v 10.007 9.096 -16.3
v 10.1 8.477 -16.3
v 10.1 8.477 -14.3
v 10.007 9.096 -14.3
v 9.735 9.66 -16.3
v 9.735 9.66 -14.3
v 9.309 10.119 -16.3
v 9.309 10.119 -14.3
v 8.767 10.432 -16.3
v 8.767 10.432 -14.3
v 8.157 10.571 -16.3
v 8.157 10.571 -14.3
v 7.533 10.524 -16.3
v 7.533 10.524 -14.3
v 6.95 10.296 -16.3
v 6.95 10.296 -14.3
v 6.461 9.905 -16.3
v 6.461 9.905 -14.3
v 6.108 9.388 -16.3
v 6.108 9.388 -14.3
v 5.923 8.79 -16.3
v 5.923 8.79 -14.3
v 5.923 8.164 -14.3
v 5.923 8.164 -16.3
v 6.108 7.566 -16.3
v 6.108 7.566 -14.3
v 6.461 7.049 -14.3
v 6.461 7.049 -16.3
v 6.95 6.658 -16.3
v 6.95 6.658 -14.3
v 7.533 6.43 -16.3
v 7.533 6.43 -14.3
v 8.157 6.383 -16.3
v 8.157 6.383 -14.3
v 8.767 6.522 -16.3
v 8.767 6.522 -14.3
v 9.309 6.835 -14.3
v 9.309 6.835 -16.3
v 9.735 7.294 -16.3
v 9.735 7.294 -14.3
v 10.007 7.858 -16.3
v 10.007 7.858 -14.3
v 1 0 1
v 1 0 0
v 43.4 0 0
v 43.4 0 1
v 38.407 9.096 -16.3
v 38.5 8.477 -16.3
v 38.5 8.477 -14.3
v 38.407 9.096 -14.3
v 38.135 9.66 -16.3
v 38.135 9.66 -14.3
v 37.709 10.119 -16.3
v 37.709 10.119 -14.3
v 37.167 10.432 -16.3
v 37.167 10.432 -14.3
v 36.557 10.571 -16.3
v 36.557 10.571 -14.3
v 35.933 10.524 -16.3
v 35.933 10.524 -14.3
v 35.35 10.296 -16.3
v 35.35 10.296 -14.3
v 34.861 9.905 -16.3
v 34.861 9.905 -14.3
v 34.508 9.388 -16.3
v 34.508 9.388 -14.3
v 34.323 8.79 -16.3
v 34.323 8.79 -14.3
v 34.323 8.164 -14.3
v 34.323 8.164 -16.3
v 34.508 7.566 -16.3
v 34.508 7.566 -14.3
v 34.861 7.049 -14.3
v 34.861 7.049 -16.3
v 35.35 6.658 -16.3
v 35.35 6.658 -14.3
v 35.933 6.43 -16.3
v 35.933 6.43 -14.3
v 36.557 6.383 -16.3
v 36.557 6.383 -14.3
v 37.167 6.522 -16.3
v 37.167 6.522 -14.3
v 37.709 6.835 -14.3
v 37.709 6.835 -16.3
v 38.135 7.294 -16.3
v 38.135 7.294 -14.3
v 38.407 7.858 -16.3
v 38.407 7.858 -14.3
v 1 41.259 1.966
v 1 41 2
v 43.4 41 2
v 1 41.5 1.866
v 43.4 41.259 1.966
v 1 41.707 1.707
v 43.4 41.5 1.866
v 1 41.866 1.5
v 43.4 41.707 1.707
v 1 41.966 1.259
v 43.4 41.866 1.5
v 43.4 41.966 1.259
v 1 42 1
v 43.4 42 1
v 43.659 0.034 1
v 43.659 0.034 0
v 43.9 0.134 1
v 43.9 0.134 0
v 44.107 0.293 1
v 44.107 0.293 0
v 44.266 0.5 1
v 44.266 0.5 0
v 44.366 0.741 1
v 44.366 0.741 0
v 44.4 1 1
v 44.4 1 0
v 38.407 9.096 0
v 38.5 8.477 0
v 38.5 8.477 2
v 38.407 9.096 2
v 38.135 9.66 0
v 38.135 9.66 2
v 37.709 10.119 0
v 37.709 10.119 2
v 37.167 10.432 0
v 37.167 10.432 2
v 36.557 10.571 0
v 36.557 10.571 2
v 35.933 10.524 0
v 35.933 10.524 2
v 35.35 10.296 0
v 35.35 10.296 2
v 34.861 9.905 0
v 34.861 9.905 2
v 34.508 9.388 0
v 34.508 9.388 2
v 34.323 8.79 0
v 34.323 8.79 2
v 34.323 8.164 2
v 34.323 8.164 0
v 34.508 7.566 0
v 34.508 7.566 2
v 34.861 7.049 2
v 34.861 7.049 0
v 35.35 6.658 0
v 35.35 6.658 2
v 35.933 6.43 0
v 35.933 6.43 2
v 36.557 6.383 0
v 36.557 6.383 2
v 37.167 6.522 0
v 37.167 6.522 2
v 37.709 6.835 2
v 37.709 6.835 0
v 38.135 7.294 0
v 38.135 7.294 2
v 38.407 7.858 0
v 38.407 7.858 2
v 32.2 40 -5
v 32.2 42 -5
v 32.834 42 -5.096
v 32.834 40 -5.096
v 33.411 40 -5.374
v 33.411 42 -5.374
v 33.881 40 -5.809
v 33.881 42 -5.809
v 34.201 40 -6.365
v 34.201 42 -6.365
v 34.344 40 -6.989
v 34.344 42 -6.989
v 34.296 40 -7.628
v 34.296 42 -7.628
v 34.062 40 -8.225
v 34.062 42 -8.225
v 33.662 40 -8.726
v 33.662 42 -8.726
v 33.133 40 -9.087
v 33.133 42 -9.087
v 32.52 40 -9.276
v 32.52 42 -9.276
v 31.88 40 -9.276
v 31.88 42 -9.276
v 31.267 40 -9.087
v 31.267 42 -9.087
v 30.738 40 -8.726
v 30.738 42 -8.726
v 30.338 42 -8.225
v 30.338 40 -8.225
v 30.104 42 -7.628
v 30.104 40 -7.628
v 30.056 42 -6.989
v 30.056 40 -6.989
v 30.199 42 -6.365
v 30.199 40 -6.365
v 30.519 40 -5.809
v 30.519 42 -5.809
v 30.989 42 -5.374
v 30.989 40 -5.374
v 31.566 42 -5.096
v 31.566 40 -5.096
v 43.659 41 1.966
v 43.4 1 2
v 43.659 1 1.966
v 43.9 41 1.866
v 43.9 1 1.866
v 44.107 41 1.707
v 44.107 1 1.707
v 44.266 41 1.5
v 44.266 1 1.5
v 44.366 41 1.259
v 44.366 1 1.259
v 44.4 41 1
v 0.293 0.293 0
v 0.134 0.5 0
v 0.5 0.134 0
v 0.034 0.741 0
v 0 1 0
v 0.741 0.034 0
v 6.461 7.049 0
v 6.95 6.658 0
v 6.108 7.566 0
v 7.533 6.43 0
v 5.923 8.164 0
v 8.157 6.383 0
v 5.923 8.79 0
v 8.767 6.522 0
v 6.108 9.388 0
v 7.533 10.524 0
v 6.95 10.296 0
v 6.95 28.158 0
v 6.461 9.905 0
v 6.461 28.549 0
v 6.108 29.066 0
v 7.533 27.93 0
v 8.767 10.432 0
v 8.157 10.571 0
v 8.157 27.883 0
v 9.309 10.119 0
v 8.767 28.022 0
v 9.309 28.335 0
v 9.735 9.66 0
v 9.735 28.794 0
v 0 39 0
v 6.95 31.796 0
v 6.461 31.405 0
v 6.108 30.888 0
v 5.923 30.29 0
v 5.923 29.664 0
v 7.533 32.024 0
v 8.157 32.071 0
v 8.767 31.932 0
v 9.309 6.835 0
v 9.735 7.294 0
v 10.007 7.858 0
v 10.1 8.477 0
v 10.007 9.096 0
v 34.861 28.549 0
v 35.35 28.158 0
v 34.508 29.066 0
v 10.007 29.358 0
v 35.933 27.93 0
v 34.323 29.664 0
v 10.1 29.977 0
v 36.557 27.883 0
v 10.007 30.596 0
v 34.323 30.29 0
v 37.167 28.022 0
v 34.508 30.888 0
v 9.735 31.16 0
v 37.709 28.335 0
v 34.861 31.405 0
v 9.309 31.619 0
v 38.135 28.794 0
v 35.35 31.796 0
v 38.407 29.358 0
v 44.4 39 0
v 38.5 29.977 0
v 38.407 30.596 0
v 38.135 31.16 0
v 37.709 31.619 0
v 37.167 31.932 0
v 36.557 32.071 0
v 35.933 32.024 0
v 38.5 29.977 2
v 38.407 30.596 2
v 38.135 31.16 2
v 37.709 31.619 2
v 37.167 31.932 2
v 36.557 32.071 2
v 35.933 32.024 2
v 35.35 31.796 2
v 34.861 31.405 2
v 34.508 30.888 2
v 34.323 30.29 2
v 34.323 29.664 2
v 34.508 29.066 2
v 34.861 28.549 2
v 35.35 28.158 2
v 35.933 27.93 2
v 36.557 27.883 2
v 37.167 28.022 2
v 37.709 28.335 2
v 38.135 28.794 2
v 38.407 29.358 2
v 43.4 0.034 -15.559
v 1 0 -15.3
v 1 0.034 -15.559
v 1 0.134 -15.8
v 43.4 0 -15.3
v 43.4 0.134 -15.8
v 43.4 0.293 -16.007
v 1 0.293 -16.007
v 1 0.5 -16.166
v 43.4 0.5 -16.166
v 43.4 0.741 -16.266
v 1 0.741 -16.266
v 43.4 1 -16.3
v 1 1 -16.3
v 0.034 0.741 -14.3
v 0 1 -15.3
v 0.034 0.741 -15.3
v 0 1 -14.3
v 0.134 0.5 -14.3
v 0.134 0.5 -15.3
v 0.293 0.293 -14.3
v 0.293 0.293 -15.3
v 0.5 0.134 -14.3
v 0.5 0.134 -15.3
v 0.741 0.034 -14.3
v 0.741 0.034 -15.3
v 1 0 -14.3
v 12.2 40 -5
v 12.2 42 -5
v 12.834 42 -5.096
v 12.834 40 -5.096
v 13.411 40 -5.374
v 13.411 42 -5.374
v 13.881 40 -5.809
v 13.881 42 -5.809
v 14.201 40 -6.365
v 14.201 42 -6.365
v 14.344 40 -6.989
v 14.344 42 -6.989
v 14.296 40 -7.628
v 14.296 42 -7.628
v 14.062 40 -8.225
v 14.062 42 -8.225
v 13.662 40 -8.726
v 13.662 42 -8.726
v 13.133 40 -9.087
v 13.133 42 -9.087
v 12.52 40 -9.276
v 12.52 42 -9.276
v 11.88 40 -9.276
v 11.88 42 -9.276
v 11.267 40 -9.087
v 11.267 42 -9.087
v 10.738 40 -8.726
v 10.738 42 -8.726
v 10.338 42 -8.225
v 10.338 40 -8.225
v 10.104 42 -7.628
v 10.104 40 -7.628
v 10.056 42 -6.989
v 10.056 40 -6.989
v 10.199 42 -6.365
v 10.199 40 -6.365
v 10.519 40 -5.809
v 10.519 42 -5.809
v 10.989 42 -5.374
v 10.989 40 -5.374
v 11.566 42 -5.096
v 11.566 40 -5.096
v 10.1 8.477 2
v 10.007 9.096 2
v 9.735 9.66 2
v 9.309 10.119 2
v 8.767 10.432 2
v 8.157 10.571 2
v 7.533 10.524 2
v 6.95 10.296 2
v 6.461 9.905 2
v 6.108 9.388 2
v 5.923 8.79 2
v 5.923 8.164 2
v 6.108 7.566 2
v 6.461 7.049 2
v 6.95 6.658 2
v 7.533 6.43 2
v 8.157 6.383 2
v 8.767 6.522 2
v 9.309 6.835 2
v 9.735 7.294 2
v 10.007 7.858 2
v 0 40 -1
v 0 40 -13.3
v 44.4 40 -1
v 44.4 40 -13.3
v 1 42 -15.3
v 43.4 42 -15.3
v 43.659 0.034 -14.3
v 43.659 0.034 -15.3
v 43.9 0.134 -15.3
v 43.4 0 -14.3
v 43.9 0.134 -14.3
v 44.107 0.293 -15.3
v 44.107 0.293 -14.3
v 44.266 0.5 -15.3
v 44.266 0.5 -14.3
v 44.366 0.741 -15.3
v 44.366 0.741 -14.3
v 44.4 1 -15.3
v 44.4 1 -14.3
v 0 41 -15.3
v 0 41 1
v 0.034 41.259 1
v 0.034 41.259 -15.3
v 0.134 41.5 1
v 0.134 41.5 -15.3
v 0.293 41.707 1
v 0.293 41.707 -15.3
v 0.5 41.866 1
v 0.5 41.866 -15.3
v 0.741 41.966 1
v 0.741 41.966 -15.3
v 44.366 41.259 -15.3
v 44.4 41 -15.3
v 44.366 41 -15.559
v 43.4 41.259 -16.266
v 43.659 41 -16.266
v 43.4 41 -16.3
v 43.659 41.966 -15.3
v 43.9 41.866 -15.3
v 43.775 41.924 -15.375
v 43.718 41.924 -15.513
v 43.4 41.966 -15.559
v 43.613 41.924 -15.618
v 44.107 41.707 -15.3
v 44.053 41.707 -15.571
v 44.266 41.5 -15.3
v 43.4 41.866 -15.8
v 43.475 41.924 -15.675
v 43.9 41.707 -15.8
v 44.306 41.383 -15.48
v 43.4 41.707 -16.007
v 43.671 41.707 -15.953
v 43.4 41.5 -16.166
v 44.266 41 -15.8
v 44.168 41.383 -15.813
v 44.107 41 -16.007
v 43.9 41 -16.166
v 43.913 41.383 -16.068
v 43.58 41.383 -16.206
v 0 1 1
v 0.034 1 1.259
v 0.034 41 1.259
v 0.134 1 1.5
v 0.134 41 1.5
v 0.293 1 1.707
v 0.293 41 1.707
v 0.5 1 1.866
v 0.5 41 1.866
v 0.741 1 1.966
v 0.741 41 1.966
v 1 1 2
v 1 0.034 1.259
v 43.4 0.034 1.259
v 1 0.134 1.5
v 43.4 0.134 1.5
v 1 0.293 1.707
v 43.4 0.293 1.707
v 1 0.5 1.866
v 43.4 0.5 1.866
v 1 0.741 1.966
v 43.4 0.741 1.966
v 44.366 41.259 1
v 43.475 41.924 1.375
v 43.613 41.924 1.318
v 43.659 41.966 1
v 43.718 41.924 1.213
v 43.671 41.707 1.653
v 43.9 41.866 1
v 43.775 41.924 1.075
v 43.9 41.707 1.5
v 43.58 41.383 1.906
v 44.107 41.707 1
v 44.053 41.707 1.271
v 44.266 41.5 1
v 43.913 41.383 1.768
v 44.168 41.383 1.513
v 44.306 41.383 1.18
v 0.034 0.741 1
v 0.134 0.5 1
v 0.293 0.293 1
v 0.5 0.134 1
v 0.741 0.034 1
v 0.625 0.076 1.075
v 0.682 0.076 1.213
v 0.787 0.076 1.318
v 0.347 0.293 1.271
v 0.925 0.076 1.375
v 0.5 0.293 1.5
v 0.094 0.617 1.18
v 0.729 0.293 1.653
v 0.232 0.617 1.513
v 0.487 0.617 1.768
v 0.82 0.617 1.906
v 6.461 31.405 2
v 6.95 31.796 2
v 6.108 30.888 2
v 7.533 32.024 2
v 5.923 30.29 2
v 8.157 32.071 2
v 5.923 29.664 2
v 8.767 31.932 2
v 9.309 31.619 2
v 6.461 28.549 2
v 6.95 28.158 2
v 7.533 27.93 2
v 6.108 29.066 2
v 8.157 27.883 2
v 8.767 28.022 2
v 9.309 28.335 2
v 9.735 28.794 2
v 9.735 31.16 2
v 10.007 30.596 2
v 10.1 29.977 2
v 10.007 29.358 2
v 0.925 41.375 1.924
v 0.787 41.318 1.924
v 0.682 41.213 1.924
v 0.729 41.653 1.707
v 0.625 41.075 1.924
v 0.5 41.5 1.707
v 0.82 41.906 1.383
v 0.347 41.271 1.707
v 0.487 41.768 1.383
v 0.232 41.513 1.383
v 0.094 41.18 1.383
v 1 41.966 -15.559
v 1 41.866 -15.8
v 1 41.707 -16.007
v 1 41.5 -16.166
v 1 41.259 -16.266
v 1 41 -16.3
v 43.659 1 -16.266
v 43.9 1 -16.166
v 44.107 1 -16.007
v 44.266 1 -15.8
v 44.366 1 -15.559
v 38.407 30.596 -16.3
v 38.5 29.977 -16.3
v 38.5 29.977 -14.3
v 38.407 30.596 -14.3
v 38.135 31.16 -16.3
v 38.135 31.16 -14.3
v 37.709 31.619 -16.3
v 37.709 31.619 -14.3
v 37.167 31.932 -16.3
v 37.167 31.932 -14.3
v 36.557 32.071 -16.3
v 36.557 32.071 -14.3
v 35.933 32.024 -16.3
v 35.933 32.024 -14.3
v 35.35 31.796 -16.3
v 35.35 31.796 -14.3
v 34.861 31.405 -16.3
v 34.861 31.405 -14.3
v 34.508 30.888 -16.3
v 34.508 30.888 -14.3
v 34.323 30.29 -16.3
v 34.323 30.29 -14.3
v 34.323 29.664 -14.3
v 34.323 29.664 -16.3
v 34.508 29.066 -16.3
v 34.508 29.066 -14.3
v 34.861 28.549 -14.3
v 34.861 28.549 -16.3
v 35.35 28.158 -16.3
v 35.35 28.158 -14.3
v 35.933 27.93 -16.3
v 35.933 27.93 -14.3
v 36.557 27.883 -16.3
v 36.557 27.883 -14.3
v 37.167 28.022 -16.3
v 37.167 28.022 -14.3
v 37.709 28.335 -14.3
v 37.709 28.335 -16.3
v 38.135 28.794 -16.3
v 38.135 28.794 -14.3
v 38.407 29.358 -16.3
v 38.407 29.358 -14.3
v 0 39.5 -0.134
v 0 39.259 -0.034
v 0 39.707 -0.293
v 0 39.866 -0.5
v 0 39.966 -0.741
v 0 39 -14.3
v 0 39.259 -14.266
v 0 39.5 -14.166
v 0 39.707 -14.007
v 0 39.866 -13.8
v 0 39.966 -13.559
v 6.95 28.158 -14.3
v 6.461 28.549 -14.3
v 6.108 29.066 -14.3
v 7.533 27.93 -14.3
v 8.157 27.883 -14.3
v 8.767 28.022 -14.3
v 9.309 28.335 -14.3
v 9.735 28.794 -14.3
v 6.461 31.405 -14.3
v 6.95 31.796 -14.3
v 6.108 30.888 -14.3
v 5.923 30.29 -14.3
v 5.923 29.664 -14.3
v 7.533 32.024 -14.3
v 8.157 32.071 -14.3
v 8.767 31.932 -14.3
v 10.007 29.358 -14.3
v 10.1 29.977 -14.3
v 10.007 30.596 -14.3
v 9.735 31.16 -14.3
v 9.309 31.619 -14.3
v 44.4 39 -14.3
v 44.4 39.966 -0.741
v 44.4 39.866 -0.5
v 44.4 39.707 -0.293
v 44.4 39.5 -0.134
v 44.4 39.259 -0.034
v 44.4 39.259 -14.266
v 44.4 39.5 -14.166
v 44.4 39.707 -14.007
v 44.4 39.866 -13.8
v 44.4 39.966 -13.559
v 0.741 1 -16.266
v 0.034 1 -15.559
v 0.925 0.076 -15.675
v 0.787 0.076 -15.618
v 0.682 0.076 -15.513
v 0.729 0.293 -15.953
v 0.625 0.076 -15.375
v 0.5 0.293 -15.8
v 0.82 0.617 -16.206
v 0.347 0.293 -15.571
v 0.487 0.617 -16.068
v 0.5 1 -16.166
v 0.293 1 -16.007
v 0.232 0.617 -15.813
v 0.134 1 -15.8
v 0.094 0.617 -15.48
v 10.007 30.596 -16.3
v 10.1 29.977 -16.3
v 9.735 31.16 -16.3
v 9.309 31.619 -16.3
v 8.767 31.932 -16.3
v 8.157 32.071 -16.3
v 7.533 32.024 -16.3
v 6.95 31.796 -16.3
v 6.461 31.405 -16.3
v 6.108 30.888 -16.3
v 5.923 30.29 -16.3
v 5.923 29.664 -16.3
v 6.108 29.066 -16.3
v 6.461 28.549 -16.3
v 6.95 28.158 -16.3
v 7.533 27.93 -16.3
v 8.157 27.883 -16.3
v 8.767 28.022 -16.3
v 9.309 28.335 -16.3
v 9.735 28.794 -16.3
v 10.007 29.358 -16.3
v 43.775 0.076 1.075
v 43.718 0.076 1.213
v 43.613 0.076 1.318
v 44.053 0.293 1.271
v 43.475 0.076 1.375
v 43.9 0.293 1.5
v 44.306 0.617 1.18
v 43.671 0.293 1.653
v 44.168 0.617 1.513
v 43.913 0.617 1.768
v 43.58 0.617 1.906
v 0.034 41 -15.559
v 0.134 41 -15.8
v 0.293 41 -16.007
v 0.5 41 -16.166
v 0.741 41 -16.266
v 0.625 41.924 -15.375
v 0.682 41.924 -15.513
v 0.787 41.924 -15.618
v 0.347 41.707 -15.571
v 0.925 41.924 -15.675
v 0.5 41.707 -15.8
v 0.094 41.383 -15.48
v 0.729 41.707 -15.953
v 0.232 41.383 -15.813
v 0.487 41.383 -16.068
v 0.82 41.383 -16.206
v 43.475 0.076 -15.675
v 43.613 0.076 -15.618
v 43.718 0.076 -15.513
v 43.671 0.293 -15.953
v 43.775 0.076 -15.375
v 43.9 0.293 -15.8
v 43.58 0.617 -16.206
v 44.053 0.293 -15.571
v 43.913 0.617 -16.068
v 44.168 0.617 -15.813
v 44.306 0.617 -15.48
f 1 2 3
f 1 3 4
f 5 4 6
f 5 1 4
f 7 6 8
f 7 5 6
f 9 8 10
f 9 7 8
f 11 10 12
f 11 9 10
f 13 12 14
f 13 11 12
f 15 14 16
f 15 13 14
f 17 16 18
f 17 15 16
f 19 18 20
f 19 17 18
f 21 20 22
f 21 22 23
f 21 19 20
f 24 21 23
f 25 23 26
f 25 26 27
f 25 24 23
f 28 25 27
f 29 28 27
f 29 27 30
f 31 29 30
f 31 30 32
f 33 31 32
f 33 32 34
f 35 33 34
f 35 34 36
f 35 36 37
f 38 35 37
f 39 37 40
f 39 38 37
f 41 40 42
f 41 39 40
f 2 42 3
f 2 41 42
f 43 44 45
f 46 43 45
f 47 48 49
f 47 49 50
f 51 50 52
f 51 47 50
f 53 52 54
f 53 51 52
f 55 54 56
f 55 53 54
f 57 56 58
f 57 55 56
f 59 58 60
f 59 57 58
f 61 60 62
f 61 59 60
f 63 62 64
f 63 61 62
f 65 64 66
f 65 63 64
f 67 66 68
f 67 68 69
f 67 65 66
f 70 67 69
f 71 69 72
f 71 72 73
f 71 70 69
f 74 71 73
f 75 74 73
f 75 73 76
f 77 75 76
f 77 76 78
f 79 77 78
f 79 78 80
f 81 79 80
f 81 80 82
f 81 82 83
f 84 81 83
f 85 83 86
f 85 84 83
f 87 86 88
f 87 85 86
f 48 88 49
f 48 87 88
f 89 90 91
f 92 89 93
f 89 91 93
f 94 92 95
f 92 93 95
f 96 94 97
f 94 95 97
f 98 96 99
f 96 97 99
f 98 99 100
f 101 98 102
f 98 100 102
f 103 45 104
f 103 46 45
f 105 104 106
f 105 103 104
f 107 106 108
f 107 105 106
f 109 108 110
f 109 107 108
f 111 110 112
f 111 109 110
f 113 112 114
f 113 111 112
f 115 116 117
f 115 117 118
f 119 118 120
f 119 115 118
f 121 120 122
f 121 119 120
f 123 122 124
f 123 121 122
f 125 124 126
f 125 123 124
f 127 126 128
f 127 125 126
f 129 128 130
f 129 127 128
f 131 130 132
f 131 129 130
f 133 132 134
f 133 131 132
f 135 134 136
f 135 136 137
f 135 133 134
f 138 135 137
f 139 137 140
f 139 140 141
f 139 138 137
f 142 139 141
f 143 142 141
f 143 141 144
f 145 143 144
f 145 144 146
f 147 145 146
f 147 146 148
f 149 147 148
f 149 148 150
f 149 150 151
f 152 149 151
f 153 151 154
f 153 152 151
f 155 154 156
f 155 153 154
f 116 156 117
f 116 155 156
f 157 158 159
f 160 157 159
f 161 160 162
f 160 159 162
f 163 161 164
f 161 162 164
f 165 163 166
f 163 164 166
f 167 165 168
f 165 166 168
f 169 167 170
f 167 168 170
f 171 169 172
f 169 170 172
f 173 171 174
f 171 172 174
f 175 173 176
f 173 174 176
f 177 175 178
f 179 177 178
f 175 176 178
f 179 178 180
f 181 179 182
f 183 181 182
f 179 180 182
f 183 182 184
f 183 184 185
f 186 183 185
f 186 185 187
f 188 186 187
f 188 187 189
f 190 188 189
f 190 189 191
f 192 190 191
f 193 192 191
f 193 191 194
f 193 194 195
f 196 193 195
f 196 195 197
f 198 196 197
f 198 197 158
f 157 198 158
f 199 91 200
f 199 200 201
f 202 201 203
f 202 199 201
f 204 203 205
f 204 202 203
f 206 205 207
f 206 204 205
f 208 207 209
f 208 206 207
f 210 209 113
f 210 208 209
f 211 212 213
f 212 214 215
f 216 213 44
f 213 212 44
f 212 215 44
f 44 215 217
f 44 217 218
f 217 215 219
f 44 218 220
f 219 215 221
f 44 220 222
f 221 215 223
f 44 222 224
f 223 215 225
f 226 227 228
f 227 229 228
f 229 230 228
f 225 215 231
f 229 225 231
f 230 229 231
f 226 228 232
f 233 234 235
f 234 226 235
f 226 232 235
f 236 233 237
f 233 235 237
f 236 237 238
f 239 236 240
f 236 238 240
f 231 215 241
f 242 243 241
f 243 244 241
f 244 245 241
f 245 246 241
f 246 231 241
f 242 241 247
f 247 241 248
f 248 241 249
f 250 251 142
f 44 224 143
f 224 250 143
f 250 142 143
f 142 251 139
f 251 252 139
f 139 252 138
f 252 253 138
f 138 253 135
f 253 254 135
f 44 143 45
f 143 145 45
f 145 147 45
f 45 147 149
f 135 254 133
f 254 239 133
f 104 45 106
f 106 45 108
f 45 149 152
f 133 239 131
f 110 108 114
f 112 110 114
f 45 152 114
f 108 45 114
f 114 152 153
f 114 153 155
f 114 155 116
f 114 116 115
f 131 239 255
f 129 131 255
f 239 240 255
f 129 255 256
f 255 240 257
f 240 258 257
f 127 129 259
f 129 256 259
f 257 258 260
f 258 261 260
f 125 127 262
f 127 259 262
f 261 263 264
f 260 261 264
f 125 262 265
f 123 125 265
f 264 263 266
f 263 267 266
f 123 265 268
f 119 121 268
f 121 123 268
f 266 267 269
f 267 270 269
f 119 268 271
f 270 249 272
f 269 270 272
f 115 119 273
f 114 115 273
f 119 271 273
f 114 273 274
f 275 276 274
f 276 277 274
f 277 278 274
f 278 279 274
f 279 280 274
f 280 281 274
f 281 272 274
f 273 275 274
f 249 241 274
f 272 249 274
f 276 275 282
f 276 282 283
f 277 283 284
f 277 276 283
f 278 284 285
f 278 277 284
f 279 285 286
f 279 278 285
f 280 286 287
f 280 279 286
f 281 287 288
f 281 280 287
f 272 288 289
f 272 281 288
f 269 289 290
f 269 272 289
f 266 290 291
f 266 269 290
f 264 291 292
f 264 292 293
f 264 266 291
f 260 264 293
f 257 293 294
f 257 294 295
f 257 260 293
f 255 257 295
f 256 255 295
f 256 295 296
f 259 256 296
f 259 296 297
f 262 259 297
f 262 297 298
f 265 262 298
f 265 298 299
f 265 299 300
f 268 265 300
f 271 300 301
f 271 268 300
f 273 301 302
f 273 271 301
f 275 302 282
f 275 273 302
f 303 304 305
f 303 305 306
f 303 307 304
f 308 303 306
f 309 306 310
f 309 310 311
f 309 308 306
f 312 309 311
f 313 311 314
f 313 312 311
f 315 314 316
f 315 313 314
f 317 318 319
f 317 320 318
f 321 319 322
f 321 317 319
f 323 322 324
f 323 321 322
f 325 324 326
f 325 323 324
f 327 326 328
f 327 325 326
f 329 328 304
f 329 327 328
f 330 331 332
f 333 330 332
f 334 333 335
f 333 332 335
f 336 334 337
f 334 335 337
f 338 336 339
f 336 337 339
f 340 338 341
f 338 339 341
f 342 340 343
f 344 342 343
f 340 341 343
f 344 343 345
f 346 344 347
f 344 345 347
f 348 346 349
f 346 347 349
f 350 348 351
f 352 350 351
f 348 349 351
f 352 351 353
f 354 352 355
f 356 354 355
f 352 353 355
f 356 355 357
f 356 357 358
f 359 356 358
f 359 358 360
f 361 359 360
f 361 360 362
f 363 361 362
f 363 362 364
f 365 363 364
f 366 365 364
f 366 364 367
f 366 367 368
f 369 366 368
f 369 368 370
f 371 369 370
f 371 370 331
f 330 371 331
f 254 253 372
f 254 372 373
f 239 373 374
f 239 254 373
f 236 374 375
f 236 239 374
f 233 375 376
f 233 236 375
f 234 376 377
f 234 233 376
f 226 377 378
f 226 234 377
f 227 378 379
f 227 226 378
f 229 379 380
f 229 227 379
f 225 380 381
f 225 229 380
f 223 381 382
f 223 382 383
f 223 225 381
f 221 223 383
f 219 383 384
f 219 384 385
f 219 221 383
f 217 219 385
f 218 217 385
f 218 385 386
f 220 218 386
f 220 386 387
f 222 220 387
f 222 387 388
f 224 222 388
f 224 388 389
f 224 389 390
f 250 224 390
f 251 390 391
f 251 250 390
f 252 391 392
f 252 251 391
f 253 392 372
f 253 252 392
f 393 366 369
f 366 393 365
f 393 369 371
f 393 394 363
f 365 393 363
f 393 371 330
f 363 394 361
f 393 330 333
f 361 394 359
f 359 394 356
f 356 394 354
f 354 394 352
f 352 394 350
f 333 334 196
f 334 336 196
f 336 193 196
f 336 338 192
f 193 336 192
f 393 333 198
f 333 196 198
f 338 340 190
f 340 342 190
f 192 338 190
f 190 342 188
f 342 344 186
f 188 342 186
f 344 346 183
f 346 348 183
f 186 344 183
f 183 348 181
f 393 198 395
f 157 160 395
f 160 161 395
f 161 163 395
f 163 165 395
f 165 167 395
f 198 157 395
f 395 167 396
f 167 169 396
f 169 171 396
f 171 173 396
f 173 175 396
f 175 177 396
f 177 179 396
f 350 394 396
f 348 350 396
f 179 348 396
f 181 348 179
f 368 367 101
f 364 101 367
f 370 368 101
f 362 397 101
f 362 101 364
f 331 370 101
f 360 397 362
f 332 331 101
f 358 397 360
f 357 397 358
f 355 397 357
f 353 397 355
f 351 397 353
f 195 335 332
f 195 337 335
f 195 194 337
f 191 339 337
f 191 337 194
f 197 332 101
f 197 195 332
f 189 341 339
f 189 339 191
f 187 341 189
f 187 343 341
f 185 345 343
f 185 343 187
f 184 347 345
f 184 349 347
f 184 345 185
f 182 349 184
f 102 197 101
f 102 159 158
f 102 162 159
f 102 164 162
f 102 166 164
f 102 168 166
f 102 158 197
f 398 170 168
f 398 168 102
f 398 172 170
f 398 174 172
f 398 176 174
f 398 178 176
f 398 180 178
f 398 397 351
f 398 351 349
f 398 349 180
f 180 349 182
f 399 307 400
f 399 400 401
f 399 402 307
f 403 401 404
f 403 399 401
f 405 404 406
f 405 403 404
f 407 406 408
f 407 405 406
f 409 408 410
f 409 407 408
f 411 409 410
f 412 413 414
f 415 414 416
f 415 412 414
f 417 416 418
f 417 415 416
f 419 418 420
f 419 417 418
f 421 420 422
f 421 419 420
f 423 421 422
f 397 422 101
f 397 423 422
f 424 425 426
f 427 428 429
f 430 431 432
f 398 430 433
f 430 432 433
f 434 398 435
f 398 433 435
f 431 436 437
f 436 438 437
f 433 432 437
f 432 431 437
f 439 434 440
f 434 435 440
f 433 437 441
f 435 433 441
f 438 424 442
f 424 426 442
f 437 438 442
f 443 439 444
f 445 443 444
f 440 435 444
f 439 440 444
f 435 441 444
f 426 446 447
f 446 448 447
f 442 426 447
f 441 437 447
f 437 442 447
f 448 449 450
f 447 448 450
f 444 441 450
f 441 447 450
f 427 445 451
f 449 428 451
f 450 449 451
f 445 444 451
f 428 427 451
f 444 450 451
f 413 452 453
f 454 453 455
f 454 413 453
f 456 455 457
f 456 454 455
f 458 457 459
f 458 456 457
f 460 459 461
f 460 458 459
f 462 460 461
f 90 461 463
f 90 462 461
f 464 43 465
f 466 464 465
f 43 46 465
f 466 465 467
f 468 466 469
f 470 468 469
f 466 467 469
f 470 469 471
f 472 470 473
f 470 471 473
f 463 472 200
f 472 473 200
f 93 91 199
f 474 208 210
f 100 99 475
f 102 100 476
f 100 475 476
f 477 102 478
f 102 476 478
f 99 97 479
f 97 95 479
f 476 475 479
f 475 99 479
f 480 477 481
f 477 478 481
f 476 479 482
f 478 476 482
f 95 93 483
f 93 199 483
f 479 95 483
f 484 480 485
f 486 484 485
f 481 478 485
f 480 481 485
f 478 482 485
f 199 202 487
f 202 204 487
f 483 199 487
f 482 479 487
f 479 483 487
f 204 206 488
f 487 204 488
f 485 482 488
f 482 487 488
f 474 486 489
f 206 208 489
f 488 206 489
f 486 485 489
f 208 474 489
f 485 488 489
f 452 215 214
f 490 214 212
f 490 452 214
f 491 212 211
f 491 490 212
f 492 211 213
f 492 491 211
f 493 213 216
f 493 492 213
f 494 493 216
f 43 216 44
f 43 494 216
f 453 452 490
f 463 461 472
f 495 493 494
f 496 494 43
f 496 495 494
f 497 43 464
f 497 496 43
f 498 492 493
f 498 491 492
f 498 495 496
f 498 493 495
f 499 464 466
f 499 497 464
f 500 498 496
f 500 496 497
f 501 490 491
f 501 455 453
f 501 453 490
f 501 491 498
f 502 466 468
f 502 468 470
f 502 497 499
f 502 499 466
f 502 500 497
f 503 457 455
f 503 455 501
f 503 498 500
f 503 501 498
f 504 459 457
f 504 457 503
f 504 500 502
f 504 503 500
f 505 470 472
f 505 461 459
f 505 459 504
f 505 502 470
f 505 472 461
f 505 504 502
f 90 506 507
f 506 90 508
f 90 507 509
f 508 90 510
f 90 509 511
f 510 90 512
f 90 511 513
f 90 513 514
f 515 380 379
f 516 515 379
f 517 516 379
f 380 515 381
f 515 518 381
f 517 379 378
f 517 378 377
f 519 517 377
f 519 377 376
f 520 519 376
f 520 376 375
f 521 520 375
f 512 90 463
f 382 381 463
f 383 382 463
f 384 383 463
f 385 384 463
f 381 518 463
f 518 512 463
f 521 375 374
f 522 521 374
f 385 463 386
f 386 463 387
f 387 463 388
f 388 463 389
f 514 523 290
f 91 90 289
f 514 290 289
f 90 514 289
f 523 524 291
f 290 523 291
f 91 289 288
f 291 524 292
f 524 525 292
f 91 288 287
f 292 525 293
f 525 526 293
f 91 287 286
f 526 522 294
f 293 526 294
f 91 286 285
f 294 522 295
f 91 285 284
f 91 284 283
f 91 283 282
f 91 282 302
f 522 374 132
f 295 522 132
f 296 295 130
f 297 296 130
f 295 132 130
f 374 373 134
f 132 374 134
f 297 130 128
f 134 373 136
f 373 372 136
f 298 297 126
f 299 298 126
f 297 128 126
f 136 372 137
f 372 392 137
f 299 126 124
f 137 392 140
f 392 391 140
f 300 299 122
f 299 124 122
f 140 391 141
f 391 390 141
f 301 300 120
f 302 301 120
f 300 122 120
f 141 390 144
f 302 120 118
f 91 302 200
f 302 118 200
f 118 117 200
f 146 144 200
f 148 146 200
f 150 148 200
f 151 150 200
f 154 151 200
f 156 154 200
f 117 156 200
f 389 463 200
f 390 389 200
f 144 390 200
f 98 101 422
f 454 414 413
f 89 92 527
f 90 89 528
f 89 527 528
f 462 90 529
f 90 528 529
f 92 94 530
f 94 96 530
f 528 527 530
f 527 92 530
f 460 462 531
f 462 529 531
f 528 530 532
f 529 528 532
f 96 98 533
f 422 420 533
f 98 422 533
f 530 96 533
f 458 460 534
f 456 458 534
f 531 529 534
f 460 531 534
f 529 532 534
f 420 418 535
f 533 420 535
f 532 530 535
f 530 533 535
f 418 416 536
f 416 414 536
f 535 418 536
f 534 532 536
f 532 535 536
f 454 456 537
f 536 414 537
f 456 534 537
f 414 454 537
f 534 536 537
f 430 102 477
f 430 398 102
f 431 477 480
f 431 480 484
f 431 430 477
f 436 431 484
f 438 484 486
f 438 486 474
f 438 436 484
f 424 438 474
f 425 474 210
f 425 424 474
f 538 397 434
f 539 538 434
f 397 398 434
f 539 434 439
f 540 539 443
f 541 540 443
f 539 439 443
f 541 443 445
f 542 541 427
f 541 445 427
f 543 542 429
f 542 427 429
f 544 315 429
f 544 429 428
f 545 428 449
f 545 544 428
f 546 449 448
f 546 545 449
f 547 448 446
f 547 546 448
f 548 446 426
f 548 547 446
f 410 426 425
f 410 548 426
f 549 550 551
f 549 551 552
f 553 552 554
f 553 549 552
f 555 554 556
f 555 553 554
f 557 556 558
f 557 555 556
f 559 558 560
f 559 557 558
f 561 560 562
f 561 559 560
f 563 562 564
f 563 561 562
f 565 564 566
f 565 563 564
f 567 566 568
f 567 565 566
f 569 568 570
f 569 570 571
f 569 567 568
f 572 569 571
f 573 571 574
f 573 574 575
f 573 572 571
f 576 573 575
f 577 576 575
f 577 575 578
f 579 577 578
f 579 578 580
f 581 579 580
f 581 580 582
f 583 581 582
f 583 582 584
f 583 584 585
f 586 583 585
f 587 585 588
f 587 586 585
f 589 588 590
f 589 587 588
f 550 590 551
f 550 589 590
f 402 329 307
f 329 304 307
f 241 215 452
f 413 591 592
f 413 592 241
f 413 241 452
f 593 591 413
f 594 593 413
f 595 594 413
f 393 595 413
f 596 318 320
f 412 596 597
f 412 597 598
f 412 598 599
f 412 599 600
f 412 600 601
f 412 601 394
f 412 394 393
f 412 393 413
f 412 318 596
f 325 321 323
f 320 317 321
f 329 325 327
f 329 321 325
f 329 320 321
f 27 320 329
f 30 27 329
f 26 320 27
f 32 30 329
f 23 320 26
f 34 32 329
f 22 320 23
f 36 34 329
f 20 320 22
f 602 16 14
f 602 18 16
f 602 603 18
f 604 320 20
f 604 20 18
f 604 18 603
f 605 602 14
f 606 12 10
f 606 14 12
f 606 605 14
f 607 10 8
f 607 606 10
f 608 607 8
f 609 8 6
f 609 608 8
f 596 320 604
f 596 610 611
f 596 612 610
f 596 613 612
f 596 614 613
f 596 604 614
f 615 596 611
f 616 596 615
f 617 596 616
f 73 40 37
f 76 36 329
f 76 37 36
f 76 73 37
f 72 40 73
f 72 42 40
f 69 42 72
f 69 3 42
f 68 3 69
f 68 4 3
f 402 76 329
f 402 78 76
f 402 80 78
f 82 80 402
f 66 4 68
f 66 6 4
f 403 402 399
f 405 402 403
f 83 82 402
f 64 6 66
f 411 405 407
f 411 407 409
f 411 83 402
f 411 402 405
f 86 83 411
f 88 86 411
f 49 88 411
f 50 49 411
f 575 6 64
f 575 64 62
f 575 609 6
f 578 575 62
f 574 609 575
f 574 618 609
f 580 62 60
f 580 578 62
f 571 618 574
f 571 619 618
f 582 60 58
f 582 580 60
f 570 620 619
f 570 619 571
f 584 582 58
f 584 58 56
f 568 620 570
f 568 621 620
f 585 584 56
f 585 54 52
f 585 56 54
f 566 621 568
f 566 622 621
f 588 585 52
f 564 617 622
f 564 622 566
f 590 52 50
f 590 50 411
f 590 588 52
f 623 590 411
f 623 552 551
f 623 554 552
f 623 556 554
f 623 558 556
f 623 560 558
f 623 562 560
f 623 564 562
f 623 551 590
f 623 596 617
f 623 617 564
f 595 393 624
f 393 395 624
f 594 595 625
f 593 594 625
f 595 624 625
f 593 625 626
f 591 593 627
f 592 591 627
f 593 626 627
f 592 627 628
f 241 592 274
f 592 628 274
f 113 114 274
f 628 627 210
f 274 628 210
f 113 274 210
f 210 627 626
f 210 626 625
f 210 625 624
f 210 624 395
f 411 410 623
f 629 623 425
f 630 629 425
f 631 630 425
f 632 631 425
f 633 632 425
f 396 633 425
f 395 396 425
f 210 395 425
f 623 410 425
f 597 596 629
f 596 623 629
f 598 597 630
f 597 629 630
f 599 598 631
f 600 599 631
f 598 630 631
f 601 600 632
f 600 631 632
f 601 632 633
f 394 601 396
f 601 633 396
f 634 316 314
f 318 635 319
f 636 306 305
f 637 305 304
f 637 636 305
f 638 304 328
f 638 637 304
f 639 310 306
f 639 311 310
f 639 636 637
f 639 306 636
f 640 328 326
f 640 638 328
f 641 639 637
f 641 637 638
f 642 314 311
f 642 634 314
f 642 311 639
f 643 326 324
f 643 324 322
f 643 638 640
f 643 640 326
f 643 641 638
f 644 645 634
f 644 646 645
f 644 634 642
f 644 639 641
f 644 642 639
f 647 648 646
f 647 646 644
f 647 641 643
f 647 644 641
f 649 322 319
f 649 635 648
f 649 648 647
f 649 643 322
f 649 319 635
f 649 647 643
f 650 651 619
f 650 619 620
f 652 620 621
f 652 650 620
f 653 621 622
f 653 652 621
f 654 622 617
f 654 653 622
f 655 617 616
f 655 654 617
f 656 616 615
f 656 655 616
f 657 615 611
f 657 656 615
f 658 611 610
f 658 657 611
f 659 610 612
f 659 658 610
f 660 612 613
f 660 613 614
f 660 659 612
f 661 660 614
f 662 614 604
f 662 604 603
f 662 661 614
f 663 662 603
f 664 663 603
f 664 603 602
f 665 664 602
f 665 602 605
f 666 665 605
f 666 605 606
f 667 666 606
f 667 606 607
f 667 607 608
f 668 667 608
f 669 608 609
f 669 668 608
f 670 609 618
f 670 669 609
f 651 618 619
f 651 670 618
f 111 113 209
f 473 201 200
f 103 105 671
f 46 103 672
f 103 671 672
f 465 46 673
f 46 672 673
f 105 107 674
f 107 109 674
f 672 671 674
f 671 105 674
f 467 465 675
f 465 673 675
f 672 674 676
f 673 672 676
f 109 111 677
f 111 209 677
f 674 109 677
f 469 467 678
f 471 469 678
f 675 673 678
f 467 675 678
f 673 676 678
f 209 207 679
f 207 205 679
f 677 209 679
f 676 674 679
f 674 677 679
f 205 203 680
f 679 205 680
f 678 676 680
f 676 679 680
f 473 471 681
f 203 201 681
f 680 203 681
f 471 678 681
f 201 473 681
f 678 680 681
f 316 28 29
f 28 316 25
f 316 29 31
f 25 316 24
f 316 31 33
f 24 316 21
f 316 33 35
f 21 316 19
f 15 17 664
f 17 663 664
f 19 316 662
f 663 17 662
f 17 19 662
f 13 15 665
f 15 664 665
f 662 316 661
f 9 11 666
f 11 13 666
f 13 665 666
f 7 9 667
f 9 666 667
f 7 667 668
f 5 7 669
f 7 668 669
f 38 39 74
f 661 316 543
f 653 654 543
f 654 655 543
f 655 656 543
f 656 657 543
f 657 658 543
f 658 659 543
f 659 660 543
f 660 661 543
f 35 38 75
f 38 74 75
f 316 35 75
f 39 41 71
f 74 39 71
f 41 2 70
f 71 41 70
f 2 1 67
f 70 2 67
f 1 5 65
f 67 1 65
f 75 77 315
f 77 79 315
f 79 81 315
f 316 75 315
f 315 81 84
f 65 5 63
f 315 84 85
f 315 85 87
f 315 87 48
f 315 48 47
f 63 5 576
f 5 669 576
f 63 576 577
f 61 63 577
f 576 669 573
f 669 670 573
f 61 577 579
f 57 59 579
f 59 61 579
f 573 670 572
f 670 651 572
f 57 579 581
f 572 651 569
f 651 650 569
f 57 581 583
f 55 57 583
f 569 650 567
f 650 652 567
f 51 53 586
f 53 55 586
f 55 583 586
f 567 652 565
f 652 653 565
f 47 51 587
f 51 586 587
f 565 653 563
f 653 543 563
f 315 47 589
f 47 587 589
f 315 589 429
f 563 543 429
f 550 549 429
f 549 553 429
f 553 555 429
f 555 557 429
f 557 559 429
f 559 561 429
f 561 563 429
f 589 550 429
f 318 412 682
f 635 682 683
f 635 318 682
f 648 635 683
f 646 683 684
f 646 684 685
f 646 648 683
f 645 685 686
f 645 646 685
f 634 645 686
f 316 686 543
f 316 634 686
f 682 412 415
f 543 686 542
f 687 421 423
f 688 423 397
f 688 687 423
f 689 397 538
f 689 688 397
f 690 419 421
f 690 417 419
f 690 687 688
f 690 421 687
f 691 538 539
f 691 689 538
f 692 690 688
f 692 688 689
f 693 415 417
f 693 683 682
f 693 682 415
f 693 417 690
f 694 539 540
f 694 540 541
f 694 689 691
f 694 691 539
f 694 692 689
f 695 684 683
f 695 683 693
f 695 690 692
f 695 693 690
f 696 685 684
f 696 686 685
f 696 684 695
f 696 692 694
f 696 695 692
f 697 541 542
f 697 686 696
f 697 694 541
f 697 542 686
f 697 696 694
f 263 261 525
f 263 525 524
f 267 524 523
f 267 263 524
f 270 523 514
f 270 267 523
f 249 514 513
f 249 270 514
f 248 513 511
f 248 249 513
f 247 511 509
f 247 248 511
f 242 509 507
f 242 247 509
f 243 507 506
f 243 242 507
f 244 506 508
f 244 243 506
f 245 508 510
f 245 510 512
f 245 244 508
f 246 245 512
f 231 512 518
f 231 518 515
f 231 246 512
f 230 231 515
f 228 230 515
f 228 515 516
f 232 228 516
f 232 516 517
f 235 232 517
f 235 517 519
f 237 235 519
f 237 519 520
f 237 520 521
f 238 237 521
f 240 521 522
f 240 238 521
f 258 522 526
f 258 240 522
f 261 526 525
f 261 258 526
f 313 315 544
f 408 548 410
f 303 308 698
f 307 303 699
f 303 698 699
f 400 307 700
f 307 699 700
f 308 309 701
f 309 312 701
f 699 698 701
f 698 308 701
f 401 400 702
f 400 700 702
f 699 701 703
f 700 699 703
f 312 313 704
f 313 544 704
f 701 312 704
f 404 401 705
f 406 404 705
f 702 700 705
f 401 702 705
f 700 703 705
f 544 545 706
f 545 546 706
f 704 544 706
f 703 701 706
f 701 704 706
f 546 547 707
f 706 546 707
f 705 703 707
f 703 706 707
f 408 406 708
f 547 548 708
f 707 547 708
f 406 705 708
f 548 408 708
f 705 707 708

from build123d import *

# Parameters (mm, degrees)
SKETCH1_W           = 44.4
SKETCH1_H           = 40
SKETCH1_R           = 2.1
BOSS_EXTRUDE1_DEPTH = 2
SKETCH2_W           = 44.4
SKETCH2_H           = 18.3
BOSS_EXTRUDE2_DEPTH = 2
LPATTERN1_COUNT     = 2
LPATTERN1_PITCH     = 16.3
SKETCH3_R           = 2.15
CUT_EXTRUDE1_DEPTH  = 64.253853638
FILLET4_R           = 1


with BuildPart() as part:
    # Sketch1 → Boss-Extrude1 (new body)
    with BuildSketch(Plane.XY):
        with Locations((22.2, 20)):
            Rectangle(SKETCH1_W, SKETCH1_H)
        with Locations((8, 8.476902454)):
            Circle(SKETCH1_R, mode=Mode.SUBTRACT)
        with Locations((8, 29.976902454)):
            Circle(SKETCH1_R, mode=Mode.SUBTRACT)
        with Locations((36.4, 29.976902454)):
            Circle(SKETCH1_R, mode=Mode.SUBTRACT)
        with Locations((36.4, 8.476902454)):
            Circle(SKETCH1_R, mode=Mode.SUBTRACT)
    boss_extrude1 = extrude(amount=BOSS_EXTRUDE1_DEPTH)

    # Sketch2 → Boss-Extrude2 (add)
    with BuildSketch(Plane(origin=(0, 40, 0), x_dir=(1, 0, 0), z_dir=(0, 1, 0))):
        with Locations((22.2, 7.15)):
            Rectangle(SKETCH2_W, SKETCH2_H)
    extrude(amount=BOSS_EXTRUDE2_DEPTH)

    # LPattern1: Boss-Extrude1 ×2
    with Locations(*[(0, 0, -i * LPATTERN1_PITCH) for i in range(1, LPATTERN1_COUNT)]):
        add(boss_extrude1)

    # Sketch3 → Cut-Extrude1 (cut, through all)
    with BuildSketch(Plane(origin=(0, 42, 0), x_dir=(1, 0, 0), z_dir=(0, 1, 0))):
        with Locations(Location((12.2, 7.15, 0), (0, 0, 270))):
            Circle(SKETCH3_R)
        with Locations(Location((32.2, 7.15, 0), (0, 0, 270))):
            Circle(SKETCH3_R)
    extrude(amount=-CUT_EXTRUDE1_DEPTH, mode=Mode.SUBTRACT)

    # Fillet4
    fillet4_edges = [part.edges().sort_by_distance(p)[0] for p in [
        (44.4, 21, 2),
        (0, 21, -16.3),
        (44.4, 21, -16.3),
        (0, 42, -7.15),
        (22.2, 42, 2),
        (44.4, 42, -7.15),
        (22.2, 42, -16.3),
        (22.2, 40, -14.3),
        (22.2, 0, -16.3),
        (0, 0, -15.3),
        (44.4, 0, -15.3),
        (0, 21, 2),
        (22.2, 40, 0),
        (44.4, 0, 1),
        (0, 0, 1),
        (22.2, 0, 2),
    ]]
    fillet(fillet4_edges, radius=FILLET4_R)


solid = part.part
